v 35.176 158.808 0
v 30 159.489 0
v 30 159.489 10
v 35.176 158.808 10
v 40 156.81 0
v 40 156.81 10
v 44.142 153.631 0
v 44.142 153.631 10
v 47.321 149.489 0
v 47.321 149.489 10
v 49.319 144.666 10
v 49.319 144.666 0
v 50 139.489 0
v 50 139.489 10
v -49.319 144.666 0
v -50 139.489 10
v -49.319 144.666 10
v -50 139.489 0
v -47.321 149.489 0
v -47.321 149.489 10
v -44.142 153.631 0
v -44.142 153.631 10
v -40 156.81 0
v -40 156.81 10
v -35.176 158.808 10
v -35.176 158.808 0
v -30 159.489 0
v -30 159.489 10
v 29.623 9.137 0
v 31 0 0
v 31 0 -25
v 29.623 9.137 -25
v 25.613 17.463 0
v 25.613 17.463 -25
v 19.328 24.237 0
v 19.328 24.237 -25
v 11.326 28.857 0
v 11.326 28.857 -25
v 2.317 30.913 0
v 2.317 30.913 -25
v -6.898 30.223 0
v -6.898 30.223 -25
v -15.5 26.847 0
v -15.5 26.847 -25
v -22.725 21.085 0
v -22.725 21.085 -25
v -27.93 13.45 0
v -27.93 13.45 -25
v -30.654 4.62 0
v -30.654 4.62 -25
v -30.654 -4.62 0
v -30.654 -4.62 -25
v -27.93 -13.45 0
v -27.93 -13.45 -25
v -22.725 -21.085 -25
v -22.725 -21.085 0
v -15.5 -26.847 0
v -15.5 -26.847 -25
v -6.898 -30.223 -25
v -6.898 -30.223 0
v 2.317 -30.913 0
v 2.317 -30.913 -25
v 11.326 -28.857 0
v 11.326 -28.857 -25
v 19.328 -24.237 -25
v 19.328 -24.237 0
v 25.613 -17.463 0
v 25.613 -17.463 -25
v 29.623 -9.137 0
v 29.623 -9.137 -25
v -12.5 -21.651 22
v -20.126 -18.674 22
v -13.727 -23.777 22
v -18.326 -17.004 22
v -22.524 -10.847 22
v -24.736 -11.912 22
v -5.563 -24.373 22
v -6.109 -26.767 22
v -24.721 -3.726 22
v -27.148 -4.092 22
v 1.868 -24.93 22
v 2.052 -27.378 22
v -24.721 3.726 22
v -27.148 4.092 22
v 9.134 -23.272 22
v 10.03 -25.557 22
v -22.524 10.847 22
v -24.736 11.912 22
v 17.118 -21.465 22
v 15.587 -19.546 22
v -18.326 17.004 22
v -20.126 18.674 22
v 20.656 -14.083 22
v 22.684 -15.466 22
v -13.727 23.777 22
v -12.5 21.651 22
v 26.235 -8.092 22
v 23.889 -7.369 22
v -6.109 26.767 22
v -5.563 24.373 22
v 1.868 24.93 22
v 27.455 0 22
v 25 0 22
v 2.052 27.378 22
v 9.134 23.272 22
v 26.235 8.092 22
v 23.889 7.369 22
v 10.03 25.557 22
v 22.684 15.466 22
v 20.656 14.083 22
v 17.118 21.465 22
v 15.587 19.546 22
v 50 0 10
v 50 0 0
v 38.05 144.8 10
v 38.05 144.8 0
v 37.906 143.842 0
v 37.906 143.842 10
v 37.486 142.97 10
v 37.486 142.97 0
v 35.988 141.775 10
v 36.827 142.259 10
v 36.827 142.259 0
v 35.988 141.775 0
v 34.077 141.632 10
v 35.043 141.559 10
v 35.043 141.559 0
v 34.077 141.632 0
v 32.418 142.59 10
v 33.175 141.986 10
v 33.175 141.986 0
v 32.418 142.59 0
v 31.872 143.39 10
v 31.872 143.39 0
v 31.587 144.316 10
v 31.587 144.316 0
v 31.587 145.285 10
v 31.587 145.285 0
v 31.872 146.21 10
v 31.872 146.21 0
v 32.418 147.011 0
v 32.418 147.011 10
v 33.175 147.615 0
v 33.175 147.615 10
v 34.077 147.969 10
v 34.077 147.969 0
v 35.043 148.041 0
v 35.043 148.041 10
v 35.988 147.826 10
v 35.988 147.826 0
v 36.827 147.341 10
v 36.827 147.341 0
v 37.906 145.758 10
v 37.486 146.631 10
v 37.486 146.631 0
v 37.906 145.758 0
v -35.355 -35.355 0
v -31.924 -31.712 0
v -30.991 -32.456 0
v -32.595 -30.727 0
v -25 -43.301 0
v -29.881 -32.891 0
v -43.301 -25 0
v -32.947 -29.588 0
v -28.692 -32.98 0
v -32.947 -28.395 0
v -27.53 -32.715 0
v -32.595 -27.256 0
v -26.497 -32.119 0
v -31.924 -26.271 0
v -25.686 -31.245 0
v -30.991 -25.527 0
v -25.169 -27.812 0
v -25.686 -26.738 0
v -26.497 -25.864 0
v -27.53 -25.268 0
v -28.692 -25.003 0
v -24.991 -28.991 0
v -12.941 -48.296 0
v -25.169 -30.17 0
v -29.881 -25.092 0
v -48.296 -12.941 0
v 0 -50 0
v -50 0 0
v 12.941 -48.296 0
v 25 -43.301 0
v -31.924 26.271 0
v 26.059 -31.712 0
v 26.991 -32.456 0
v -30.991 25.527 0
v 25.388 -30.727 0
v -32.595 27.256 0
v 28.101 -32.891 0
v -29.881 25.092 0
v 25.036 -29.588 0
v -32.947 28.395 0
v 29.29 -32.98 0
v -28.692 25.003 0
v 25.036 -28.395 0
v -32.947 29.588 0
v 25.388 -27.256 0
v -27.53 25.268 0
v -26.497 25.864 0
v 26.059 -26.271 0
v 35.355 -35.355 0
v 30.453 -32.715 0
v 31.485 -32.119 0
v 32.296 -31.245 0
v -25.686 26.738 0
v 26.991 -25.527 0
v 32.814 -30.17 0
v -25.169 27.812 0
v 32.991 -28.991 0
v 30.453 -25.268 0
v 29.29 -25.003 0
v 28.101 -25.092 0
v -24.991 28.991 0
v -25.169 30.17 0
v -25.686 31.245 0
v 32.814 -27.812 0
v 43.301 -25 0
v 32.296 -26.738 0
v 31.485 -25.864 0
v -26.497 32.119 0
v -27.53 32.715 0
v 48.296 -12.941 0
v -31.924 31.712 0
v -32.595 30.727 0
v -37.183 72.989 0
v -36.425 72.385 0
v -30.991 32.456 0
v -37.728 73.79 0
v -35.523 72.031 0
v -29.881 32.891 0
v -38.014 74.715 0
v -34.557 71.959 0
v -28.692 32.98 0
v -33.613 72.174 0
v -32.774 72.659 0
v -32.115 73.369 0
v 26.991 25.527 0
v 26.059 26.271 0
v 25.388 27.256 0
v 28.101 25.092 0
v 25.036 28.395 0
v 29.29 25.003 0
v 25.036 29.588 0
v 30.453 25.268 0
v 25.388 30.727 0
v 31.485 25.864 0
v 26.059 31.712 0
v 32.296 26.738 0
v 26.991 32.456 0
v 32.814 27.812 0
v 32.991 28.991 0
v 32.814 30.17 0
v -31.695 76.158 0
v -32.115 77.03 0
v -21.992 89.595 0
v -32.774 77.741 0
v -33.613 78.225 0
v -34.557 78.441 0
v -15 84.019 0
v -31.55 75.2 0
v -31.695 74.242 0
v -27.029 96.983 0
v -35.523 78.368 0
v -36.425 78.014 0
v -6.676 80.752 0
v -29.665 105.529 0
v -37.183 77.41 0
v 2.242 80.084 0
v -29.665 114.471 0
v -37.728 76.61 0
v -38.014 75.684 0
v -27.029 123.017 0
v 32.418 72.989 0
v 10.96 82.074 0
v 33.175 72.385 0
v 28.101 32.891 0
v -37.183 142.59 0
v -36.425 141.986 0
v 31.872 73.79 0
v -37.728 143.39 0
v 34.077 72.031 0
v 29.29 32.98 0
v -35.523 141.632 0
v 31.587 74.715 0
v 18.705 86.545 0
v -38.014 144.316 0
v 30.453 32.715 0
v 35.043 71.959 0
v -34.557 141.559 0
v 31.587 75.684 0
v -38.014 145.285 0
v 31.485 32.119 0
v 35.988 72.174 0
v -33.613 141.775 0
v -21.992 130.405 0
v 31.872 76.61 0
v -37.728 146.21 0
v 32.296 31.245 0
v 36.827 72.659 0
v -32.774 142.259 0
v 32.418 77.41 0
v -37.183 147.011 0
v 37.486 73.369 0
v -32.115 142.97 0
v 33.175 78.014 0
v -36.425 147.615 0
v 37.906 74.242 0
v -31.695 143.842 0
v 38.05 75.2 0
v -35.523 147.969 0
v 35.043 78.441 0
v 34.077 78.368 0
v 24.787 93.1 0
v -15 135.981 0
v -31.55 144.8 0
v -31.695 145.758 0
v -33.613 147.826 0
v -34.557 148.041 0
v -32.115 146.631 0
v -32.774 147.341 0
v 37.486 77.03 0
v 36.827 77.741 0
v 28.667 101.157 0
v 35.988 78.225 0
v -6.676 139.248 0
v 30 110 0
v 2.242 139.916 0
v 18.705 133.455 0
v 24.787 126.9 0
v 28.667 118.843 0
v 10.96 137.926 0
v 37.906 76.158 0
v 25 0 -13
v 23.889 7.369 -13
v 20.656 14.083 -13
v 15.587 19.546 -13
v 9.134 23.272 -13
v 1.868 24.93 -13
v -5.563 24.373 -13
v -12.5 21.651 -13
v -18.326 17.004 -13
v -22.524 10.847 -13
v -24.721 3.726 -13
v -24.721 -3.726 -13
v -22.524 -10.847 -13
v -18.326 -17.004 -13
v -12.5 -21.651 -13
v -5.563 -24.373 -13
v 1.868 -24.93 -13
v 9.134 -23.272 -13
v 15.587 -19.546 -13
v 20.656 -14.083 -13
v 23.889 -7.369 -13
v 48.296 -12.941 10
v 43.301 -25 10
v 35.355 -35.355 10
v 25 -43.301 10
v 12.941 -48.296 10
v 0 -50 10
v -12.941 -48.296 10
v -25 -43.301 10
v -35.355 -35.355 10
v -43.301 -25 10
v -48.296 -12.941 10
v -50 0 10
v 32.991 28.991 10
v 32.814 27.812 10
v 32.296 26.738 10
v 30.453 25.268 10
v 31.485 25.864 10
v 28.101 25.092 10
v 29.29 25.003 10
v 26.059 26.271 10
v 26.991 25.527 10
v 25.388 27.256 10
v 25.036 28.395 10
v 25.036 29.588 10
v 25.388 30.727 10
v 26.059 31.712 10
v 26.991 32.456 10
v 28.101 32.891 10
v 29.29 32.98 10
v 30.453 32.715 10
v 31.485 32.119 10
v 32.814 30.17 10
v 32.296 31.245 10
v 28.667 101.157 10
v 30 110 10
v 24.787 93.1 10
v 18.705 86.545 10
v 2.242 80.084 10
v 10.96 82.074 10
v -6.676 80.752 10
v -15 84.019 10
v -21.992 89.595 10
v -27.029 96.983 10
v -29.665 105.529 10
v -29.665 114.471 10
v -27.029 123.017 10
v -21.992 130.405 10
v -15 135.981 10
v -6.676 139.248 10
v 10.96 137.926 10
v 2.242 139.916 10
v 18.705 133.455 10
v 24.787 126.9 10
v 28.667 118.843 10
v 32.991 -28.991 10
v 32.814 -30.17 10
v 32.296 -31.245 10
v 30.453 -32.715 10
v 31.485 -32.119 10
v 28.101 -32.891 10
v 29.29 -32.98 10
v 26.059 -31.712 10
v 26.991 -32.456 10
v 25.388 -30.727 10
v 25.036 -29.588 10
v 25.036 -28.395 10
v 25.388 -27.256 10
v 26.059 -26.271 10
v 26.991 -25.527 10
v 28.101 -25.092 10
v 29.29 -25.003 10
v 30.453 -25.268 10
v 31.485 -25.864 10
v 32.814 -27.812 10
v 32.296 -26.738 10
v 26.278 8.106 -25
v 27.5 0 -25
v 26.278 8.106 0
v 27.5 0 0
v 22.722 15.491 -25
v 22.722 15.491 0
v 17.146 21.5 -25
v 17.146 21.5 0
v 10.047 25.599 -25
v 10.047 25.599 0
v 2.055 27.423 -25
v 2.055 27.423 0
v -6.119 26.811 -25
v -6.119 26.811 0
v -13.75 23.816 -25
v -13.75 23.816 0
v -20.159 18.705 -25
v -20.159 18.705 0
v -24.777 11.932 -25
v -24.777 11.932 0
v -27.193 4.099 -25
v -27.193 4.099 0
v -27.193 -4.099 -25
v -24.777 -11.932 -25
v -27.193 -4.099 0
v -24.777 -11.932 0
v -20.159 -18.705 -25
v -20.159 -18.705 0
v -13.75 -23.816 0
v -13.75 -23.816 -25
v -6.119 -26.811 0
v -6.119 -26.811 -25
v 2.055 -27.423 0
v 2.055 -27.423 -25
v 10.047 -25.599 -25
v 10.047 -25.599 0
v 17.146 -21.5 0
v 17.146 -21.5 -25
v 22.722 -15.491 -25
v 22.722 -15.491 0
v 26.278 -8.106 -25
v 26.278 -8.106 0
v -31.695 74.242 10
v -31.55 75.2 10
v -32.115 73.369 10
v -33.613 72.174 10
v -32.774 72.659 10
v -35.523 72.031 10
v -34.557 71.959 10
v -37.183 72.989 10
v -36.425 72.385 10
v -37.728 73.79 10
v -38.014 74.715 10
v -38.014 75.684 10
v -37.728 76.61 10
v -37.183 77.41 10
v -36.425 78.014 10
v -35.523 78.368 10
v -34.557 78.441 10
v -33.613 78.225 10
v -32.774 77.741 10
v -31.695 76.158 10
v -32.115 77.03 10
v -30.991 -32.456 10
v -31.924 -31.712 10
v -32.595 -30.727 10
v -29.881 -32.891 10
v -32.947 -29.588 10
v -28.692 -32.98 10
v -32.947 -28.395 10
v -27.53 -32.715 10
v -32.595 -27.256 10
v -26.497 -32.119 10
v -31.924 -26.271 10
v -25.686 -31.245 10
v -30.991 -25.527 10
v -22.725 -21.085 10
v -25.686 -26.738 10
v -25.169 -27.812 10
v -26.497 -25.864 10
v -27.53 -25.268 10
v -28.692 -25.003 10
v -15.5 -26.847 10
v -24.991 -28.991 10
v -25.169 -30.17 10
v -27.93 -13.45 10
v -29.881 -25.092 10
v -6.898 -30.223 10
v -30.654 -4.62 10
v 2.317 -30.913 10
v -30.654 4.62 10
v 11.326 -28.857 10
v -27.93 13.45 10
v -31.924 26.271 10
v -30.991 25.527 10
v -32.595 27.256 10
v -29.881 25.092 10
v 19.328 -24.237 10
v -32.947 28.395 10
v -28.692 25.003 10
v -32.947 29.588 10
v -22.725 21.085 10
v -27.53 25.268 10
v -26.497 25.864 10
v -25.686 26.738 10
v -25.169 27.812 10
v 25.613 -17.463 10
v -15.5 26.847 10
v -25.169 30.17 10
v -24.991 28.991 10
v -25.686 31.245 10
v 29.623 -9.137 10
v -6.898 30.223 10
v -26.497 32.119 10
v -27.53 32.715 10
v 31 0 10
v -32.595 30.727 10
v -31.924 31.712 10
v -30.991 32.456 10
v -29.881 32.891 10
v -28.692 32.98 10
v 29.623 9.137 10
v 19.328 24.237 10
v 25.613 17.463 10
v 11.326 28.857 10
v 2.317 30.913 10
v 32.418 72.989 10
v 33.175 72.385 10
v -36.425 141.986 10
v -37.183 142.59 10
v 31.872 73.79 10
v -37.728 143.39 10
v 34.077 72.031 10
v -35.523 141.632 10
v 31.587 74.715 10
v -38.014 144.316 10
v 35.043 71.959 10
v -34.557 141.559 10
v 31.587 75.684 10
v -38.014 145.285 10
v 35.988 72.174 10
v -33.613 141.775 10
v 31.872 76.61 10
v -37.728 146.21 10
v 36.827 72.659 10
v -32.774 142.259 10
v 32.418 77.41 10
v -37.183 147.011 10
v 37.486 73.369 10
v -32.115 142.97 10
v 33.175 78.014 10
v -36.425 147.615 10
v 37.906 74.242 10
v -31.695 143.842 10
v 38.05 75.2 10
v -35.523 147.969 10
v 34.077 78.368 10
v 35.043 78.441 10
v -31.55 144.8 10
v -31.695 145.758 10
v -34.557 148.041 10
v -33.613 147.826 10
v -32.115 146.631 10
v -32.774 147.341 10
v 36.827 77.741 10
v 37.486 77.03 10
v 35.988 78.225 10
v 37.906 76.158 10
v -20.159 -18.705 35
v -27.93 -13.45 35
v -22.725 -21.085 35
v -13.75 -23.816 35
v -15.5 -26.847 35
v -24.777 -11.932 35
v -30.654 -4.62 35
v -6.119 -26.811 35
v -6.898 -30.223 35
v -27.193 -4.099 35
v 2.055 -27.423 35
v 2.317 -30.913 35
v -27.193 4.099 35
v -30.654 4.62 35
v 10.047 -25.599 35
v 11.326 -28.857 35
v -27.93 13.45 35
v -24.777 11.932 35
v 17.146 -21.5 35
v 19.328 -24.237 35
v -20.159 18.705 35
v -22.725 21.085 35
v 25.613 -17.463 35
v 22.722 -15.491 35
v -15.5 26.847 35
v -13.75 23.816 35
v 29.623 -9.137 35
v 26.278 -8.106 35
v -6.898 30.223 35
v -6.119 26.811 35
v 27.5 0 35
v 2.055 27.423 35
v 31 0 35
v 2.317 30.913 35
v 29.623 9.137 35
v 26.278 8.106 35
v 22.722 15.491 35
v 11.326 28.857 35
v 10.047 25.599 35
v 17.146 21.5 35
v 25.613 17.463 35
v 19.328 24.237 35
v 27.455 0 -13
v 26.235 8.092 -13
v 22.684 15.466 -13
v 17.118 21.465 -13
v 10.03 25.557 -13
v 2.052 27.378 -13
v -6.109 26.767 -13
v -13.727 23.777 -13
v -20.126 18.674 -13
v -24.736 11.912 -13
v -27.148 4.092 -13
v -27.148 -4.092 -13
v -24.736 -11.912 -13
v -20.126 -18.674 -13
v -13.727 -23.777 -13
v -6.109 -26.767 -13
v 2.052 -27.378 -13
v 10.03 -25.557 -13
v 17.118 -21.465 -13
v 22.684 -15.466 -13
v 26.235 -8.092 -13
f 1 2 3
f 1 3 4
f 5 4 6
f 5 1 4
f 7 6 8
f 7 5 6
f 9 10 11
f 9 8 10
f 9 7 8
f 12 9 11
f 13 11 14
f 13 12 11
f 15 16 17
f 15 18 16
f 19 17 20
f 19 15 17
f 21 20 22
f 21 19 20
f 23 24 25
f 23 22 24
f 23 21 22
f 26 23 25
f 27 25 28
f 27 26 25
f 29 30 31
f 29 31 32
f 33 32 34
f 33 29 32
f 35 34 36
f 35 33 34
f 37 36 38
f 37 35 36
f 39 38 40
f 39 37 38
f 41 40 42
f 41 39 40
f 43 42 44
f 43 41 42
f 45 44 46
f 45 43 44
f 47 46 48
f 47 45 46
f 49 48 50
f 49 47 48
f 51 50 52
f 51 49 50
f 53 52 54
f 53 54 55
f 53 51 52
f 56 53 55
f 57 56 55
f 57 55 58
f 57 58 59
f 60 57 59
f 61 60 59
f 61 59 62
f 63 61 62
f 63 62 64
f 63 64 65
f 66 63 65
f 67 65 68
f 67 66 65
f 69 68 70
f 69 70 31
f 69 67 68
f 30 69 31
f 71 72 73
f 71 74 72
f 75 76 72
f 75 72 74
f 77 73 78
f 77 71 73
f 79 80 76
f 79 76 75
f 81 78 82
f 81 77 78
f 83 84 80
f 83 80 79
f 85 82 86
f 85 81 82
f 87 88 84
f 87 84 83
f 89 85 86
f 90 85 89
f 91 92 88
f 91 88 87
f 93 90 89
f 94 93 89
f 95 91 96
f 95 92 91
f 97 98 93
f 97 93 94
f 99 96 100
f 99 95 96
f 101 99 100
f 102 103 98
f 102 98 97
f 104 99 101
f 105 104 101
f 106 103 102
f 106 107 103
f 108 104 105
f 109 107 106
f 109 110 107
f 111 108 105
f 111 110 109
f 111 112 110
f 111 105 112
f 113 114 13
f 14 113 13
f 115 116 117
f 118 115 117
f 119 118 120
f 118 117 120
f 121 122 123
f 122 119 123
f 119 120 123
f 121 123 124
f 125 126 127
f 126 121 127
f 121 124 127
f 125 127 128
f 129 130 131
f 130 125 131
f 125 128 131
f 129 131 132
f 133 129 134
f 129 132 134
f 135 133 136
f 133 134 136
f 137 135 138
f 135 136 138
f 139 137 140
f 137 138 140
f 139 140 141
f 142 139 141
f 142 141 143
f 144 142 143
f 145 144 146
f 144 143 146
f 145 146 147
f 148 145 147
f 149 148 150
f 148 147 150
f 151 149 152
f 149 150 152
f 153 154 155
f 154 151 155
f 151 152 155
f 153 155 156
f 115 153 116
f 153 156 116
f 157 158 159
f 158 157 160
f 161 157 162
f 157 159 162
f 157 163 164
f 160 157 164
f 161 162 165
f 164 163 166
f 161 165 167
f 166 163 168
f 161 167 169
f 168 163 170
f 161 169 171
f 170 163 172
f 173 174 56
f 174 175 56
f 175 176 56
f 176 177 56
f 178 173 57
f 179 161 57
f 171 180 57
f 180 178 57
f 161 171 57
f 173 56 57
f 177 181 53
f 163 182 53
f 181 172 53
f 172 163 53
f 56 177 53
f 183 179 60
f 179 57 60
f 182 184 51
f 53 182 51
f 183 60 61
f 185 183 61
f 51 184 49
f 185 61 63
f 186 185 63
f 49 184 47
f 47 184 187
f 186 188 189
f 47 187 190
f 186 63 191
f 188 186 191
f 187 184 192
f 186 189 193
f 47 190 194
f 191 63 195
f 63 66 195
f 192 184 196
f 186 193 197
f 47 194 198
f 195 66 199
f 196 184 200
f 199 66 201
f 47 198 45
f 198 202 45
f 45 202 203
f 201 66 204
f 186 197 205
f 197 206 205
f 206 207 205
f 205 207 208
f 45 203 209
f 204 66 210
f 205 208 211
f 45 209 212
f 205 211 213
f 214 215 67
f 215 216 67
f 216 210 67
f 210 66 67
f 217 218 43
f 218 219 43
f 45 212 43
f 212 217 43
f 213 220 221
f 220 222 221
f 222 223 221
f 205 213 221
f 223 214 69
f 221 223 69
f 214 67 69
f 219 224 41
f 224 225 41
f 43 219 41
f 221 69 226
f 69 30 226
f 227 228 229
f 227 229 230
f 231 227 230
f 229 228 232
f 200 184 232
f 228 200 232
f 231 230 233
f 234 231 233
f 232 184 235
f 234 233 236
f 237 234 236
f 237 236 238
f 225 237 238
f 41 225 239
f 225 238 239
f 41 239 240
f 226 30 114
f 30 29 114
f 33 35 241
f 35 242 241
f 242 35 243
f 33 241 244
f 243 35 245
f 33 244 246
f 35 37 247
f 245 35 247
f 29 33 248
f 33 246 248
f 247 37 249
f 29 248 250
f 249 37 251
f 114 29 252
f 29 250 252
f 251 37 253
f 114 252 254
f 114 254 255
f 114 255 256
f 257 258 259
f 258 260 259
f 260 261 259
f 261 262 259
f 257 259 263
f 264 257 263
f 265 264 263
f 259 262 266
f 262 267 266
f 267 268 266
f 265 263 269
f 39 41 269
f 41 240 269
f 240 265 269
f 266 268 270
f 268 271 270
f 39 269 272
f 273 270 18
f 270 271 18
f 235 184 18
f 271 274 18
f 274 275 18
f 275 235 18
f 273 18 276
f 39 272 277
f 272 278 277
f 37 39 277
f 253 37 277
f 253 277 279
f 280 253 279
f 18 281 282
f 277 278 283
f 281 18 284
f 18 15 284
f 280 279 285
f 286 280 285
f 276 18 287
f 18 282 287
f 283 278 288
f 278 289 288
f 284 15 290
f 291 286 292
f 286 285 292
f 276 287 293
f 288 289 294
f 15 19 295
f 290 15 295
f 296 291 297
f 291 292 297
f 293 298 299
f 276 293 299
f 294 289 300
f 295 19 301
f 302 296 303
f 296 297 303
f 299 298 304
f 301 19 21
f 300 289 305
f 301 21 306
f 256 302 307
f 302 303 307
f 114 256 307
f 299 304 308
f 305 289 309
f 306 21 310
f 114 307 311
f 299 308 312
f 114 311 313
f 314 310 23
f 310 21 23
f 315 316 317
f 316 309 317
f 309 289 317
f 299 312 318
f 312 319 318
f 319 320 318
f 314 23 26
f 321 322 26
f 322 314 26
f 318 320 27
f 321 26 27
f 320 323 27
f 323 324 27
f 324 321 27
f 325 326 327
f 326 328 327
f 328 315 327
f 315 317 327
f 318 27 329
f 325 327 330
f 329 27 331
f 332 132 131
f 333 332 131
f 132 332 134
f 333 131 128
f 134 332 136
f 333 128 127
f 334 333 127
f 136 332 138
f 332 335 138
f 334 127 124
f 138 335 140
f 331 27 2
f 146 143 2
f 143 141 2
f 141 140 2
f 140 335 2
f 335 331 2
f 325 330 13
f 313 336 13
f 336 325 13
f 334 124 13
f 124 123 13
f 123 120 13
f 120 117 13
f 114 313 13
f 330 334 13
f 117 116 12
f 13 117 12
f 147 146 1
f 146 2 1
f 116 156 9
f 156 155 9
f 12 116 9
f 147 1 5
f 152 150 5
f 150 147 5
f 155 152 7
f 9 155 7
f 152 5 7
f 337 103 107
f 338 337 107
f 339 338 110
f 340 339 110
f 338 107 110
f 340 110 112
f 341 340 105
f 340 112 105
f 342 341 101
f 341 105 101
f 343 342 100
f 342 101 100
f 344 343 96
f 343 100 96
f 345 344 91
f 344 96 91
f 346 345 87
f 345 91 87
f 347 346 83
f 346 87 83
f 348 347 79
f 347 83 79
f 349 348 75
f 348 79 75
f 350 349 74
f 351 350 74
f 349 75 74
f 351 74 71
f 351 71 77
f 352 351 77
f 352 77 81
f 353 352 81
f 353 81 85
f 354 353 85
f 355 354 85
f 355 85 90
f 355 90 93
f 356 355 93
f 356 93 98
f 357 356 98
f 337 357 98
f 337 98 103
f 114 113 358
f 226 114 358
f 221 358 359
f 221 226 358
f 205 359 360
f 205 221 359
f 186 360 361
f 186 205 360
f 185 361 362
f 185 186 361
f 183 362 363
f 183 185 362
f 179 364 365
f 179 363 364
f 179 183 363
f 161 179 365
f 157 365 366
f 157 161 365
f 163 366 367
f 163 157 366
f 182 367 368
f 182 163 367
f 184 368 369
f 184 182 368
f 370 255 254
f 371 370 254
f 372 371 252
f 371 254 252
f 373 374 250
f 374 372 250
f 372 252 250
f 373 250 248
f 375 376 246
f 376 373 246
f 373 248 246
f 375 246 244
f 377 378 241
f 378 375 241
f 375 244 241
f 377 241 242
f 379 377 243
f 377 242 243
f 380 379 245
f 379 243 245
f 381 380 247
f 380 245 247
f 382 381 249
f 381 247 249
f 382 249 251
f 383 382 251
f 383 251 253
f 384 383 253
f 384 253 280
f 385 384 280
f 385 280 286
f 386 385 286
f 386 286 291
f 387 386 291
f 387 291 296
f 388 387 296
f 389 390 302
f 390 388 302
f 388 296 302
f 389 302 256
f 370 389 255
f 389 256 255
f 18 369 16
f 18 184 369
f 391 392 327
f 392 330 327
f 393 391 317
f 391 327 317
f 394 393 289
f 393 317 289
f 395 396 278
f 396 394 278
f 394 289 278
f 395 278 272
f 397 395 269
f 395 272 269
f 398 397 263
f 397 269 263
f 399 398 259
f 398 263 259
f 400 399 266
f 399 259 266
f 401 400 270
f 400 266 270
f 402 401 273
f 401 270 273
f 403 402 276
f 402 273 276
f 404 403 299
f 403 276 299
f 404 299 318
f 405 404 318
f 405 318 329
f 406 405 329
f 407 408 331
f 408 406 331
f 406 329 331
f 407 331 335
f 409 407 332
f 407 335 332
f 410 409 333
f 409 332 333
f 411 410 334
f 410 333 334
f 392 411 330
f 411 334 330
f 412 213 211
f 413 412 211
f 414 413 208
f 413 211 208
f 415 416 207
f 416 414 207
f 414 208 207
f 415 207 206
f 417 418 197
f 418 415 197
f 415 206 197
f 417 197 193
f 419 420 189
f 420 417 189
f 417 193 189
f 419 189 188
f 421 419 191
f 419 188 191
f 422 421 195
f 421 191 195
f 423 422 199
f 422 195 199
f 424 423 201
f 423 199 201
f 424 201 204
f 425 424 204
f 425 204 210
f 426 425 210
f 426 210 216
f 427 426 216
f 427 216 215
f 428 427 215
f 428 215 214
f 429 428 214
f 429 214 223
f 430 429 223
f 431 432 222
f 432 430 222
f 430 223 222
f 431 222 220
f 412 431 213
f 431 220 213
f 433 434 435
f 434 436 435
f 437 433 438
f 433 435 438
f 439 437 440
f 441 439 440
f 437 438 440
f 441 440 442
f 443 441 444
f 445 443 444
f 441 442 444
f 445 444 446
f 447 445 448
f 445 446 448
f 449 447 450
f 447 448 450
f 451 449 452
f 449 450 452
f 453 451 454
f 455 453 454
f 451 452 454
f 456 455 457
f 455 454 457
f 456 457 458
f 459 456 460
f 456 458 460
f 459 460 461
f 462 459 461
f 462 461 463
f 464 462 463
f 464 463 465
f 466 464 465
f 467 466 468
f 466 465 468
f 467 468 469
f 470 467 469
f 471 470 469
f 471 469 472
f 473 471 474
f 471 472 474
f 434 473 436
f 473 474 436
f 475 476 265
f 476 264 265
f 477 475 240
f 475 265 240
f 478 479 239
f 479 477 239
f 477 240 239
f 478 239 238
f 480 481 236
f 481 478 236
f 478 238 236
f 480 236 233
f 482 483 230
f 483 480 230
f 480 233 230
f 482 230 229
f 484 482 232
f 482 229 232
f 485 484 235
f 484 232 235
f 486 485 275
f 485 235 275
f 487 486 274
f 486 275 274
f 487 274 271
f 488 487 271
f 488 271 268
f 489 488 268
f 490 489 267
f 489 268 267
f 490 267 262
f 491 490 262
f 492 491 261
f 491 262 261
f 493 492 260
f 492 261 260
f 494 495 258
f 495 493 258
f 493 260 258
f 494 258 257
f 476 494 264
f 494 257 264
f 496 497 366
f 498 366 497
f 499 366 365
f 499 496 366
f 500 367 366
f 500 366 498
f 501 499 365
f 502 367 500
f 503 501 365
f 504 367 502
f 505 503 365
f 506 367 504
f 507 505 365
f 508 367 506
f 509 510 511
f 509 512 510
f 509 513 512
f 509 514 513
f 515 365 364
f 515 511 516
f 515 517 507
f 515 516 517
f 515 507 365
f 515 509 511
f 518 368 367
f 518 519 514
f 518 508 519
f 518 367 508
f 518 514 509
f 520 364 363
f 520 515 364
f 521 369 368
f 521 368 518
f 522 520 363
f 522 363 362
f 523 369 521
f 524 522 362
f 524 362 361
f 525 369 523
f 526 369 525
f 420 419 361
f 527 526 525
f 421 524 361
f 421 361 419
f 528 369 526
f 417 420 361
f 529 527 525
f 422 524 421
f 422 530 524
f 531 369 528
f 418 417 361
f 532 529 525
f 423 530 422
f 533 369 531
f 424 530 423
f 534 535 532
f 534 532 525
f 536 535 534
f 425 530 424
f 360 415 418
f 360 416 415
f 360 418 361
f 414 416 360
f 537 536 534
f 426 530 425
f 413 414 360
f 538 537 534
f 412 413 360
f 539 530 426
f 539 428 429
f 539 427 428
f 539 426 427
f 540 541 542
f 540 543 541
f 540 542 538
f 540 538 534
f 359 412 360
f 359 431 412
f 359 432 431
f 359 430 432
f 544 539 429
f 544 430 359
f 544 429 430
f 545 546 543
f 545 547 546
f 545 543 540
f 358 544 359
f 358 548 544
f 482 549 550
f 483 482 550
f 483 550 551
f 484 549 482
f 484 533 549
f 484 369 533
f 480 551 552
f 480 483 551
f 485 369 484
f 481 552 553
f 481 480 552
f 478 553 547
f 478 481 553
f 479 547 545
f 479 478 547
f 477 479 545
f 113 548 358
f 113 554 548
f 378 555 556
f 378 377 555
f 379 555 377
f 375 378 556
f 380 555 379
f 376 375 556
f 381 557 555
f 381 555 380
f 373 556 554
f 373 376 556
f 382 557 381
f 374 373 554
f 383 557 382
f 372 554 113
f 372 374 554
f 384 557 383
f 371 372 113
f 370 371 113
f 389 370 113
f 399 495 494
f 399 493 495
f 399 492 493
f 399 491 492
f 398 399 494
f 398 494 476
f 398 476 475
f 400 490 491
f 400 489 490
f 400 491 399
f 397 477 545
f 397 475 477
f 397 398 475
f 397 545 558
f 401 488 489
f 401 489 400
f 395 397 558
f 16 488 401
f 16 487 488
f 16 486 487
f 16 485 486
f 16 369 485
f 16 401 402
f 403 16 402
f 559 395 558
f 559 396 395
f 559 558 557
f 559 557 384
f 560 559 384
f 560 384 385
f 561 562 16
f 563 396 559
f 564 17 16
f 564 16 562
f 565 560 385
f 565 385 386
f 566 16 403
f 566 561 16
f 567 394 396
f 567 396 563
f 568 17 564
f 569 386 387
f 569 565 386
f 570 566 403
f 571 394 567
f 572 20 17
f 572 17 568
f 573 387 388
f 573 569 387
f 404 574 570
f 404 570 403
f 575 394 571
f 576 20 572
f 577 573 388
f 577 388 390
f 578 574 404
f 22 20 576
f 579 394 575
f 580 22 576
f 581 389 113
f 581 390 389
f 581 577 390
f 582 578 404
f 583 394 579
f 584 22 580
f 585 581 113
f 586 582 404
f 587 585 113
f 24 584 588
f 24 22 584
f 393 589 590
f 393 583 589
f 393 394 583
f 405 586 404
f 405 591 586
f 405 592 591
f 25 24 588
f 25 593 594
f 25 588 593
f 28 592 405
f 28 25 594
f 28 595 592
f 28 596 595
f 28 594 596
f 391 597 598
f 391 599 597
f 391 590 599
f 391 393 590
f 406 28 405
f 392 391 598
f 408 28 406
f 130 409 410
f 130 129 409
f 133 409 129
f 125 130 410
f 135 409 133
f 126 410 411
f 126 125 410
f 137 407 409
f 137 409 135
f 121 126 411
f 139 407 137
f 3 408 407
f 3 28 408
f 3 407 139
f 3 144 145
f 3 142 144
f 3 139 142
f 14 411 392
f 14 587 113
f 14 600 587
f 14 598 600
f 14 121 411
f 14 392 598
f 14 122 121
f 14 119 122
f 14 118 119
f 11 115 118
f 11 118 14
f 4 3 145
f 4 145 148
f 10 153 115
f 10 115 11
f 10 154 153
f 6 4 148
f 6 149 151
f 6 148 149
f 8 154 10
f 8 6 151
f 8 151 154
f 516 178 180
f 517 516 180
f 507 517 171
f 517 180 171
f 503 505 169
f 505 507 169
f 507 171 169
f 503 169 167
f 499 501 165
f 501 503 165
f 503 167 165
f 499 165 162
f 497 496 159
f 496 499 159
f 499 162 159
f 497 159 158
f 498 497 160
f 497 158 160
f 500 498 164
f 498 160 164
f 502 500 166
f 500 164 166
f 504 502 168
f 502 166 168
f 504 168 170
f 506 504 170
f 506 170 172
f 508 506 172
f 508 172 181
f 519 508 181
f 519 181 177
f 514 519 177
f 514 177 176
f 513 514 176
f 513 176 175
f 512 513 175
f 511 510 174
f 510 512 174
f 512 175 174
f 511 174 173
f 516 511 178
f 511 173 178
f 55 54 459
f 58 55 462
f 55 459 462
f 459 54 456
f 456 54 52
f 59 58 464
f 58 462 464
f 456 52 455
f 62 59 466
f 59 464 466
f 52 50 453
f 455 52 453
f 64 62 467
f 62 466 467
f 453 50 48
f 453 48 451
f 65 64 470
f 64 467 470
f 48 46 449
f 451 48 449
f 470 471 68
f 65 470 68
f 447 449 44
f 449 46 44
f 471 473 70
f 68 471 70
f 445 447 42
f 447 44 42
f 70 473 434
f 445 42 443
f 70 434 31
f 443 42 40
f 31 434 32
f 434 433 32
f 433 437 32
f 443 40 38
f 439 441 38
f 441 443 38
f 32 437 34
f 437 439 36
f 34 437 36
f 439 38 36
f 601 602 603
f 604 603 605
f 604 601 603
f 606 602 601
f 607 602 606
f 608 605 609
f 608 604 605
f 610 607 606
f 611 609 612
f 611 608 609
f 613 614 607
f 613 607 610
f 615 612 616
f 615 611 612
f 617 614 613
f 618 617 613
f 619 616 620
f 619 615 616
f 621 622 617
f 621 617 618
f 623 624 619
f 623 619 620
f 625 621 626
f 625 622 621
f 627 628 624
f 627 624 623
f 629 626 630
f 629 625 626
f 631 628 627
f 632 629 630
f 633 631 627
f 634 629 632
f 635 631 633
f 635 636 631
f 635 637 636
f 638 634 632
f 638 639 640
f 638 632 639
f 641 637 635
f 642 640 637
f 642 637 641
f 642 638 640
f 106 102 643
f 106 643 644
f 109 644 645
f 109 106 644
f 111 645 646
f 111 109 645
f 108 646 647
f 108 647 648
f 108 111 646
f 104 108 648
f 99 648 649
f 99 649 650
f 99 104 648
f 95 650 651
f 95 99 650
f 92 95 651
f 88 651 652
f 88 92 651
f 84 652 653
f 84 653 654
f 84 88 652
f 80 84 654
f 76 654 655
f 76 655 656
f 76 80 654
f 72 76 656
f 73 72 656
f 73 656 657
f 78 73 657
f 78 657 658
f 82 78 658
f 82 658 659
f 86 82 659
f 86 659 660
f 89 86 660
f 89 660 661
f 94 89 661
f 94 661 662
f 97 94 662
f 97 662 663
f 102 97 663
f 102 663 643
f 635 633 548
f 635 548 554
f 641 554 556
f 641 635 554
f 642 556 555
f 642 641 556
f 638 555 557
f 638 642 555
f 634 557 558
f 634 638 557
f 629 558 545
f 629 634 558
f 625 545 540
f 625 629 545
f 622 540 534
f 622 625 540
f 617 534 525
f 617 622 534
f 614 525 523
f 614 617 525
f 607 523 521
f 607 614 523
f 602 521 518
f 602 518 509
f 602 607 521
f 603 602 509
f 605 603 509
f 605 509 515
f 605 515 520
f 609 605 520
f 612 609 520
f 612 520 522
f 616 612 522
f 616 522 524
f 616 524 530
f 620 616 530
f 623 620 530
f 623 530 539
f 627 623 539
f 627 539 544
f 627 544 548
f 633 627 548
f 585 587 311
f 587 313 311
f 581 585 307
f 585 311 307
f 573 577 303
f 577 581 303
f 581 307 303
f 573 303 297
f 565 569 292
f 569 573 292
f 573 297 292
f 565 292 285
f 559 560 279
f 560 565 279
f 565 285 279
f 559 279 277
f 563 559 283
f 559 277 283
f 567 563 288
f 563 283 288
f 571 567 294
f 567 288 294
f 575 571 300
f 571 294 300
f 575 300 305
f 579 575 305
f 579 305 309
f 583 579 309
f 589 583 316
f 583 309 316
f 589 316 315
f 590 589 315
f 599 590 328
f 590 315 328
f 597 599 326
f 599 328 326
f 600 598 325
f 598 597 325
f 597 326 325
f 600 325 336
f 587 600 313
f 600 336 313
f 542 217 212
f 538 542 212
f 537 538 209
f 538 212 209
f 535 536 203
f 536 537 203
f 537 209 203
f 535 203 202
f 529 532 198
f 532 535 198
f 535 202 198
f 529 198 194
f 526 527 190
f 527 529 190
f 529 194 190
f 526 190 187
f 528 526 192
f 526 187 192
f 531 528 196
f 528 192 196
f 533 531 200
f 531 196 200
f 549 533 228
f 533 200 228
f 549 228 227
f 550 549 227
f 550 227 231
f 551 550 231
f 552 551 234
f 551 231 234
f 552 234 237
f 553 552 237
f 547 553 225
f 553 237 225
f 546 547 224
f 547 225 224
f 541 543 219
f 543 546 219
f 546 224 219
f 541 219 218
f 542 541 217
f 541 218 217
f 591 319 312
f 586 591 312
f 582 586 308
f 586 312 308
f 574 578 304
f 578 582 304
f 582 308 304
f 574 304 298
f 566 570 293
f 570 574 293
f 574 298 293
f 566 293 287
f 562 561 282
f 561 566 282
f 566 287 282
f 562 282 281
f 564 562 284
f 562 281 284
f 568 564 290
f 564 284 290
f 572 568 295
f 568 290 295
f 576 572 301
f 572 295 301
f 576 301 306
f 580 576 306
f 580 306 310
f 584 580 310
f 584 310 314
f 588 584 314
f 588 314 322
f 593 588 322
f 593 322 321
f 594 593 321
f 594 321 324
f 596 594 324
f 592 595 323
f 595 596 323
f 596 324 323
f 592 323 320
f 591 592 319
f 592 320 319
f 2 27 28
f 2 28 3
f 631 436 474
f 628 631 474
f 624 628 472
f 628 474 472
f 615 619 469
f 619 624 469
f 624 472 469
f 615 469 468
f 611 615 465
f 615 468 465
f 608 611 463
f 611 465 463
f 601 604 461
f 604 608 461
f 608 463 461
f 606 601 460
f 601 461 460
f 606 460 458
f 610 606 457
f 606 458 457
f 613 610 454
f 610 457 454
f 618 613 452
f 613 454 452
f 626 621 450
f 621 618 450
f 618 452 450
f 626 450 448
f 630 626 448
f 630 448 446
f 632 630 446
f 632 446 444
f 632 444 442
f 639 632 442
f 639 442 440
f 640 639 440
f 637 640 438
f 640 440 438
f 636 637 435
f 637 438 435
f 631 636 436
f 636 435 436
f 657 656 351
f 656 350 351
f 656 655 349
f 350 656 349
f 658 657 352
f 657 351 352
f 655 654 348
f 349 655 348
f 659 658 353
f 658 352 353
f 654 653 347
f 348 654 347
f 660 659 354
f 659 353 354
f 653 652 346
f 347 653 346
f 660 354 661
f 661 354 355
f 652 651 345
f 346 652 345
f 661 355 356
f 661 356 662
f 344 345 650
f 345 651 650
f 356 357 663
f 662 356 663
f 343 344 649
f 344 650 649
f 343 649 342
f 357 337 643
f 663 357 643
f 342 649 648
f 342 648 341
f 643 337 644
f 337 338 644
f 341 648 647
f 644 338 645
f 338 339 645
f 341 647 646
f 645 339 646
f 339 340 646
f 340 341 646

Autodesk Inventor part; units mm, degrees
ref_plane "YZ Plane" through (0, 0, 0) normal (1, 0, 0) x (0, 1, 0)
ref_plane "XZ Plane" through (0, 0, 0) normal (0, 1, 0) x (-1, 0, 0)
ref_plane "XY Plane" through (0, 0, 0) normal (0, 0, 1) x (1, 0, 0)
sketch "Szkic1" plane through (0, 0, 0) normal (0, 0, 1) x (1, 0, 0)
  circle A0 centre (0, 0) radius 27.5
  circle A1 centre (0, 0) radius 31
  arc A2 (-49.3103, 8.2759) -> (49.3103, 8.2759) centre (0, 0) ccw
  circle A3 centre (0, 110) radius 30
  circle A4 centre (0, 0) radius 25
  circle A5 centre (-28.9914, 28.9914) radius 4
  circle A6 centre (-28.9914, -28.9914) radius 4
  circle A7 centre (28.9914, 28.9914) radius 4
  circle A8 centre (28.9914, -28.9914) radius 4
  circle A9 centre (-34.8003, 144.8003) radius 3.25
  circle A10 centre (-34.8003, 75.1997) radius 3.25
  circle A11 centre (34.8003, 75.1997) radius 3.25
  circle A12 centre (34.8003, 144.8003) radius 3.25
  line L0 (-50, 0) -> (-50, 139.4893)
  line L1 (50, 0) -> (50, 139.4893)
  line L2 (-30, 159.4893) -> (30, 159.4893)
  arc A13 (50, 139.4893) -> (30, 159.4893) centre (30, 139.4893) ccw
  arc A14 (-30, 159.4893) -> (-50, 139.4893) centre (-30, 139.4893) ccw
  dimension "d8" = 360
  dimension "d37" = 360
  dimension "d0" = 55
  dimension "d1" = 62
  dimension "d2" = 100
  dimension "d3" = 60
  dimension "d10" = 50
  dimension "d26" = 8
  dimension "d27" = 8
  dimension "d28" = 8
  dimension "d29" = 8
  dimension "d34" = 6.5
  dimension "d41" = 20
  dimension "d42" = 20
extrude "Wyciągnięcie proste1" add sketch "Szkic1" along normal blind 35 contours A1
sketch "Szkic2" plane through (0, 0, 35) normal (0, 0, 1) x (1, 0, 0)
  circle A0 centre (0, 0) radius 25
  circle A1 centre (0, 0) radius 27.4549
  dimension "d15" = 50
extrude "Wyciągnięcie proste3" add sketch "Szkic2" against normal blind 48
extrude "Wyciągnięcie proste5" cut sketch "Szkic2" against normal blind 13
extrude "Wyciągnięcie proste6" add sketch "Szkic1" against normal blind 25 contours A1
extrude "Wyciągnięcie proste7" add sketch "Szkic1" along normal blind 10 contours L0 A14 L2 A13 L1 A2
properties part number "podstwa_obrotowa" material "Tytan"
